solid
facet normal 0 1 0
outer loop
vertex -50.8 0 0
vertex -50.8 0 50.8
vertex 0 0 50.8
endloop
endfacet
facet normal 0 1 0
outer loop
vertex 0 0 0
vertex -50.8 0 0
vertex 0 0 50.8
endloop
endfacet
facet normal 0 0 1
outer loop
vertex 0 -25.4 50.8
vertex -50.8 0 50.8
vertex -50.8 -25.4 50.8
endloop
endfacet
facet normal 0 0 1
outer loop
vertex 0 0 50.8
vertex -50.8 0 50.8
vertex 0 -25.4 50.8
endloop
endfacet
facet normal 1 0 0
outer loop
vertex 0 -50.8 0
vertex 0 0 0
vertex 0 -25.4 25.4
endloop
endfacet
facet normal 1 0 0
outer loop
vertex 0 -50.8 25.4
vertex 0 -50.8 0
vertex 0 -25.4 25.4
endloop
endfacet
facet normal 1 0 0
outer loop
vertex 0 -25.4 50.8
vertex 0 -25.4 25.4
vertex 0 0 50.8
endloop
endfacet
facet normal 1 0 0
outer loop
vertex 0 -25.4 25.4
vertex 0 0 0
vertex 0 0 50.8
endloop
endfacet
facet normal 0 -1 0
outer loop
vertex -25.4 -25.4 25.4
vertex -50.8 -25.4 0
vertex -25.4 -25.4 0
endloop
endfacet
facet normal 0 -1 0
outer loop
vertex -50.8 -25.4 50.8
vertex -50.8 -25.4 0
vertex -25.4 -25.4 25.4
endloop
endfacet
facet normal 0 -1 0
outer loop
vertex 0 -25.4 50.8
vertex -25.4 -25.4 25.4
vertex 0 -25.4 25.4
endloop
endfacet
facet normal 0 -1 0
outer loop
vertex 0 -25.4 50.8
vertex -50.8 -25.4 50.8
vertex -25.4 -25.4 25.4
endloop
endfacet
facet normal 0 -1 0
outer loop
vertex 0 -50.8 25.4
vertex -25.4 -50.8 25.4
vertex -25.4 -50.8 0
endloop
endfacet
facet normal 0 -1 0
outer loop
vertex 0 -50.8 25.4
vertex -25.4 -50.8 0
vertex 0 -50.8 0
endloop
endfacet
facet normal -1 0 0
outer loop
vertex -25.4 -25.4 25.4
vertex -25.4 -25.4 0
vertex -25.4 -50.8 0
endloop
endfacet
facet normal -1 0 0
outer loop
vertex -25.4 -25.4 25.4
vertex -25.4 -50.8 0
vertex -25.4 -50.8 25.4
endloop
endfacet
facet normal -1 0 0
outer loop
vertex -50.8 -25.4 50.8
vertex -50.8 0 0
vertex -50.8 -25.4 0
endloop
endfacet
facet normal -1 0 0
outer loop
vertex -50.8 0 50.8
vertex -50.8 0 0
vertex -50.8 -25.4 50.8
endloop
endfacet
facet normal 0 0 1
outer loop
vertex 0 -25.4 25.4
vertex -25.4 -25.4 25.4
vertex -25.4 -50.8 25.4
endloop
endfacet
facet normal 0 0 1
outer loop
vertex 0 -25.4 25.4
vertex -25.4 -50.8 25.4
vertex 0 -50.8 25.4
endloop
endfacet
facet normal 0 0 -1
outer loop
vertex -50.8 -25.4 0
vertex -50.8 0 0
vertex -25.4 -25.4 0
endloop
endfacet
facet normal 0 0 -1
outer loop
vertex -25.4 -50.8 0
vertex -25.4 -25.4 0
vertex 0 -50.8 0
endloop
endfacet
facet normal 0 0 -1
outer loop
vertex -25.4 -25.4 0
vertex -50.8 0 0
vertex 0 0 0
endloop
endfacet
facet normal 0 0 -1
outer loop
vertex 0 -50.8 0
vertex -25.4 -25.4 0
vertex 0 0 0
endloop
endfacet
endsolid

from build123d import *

# Parameters (mm, degrees)
F1_W     = 25.4
F1_H     = 25.4
F2_DEPTH = 50.8
F0_W     = 50.8
F0_H     = 50.8
F3_DEPTH = 25.4
F4_DEPTH = 25.4


with BuildPart() as f2:
    # F1 (on face) → F2 (new body)
    with BuildSketch(Plane.XZ):
        with Locations((-12.7, 12.7)):
            Rectangle(F1_W, F1_H)
    extrude(amount=F2_DEPTH)

    # F0 (on Front) → F3 (join)
    with BuildSketch(Plane.XZ):
        with Locations((-25.4, 25.4)):
            Rectangle(F0_W, F0_H)
    extrude(amount=F3_DEPTH)

    # F0 (on Front) → F4 (join)
    with BuildSketch(Plane.XZ):
        with Locations((-25.4, 25.4)):
            Rectangle(F0_W, F0_H)
    extrude(amount=F4_DEPTH)


solid = f2.part
